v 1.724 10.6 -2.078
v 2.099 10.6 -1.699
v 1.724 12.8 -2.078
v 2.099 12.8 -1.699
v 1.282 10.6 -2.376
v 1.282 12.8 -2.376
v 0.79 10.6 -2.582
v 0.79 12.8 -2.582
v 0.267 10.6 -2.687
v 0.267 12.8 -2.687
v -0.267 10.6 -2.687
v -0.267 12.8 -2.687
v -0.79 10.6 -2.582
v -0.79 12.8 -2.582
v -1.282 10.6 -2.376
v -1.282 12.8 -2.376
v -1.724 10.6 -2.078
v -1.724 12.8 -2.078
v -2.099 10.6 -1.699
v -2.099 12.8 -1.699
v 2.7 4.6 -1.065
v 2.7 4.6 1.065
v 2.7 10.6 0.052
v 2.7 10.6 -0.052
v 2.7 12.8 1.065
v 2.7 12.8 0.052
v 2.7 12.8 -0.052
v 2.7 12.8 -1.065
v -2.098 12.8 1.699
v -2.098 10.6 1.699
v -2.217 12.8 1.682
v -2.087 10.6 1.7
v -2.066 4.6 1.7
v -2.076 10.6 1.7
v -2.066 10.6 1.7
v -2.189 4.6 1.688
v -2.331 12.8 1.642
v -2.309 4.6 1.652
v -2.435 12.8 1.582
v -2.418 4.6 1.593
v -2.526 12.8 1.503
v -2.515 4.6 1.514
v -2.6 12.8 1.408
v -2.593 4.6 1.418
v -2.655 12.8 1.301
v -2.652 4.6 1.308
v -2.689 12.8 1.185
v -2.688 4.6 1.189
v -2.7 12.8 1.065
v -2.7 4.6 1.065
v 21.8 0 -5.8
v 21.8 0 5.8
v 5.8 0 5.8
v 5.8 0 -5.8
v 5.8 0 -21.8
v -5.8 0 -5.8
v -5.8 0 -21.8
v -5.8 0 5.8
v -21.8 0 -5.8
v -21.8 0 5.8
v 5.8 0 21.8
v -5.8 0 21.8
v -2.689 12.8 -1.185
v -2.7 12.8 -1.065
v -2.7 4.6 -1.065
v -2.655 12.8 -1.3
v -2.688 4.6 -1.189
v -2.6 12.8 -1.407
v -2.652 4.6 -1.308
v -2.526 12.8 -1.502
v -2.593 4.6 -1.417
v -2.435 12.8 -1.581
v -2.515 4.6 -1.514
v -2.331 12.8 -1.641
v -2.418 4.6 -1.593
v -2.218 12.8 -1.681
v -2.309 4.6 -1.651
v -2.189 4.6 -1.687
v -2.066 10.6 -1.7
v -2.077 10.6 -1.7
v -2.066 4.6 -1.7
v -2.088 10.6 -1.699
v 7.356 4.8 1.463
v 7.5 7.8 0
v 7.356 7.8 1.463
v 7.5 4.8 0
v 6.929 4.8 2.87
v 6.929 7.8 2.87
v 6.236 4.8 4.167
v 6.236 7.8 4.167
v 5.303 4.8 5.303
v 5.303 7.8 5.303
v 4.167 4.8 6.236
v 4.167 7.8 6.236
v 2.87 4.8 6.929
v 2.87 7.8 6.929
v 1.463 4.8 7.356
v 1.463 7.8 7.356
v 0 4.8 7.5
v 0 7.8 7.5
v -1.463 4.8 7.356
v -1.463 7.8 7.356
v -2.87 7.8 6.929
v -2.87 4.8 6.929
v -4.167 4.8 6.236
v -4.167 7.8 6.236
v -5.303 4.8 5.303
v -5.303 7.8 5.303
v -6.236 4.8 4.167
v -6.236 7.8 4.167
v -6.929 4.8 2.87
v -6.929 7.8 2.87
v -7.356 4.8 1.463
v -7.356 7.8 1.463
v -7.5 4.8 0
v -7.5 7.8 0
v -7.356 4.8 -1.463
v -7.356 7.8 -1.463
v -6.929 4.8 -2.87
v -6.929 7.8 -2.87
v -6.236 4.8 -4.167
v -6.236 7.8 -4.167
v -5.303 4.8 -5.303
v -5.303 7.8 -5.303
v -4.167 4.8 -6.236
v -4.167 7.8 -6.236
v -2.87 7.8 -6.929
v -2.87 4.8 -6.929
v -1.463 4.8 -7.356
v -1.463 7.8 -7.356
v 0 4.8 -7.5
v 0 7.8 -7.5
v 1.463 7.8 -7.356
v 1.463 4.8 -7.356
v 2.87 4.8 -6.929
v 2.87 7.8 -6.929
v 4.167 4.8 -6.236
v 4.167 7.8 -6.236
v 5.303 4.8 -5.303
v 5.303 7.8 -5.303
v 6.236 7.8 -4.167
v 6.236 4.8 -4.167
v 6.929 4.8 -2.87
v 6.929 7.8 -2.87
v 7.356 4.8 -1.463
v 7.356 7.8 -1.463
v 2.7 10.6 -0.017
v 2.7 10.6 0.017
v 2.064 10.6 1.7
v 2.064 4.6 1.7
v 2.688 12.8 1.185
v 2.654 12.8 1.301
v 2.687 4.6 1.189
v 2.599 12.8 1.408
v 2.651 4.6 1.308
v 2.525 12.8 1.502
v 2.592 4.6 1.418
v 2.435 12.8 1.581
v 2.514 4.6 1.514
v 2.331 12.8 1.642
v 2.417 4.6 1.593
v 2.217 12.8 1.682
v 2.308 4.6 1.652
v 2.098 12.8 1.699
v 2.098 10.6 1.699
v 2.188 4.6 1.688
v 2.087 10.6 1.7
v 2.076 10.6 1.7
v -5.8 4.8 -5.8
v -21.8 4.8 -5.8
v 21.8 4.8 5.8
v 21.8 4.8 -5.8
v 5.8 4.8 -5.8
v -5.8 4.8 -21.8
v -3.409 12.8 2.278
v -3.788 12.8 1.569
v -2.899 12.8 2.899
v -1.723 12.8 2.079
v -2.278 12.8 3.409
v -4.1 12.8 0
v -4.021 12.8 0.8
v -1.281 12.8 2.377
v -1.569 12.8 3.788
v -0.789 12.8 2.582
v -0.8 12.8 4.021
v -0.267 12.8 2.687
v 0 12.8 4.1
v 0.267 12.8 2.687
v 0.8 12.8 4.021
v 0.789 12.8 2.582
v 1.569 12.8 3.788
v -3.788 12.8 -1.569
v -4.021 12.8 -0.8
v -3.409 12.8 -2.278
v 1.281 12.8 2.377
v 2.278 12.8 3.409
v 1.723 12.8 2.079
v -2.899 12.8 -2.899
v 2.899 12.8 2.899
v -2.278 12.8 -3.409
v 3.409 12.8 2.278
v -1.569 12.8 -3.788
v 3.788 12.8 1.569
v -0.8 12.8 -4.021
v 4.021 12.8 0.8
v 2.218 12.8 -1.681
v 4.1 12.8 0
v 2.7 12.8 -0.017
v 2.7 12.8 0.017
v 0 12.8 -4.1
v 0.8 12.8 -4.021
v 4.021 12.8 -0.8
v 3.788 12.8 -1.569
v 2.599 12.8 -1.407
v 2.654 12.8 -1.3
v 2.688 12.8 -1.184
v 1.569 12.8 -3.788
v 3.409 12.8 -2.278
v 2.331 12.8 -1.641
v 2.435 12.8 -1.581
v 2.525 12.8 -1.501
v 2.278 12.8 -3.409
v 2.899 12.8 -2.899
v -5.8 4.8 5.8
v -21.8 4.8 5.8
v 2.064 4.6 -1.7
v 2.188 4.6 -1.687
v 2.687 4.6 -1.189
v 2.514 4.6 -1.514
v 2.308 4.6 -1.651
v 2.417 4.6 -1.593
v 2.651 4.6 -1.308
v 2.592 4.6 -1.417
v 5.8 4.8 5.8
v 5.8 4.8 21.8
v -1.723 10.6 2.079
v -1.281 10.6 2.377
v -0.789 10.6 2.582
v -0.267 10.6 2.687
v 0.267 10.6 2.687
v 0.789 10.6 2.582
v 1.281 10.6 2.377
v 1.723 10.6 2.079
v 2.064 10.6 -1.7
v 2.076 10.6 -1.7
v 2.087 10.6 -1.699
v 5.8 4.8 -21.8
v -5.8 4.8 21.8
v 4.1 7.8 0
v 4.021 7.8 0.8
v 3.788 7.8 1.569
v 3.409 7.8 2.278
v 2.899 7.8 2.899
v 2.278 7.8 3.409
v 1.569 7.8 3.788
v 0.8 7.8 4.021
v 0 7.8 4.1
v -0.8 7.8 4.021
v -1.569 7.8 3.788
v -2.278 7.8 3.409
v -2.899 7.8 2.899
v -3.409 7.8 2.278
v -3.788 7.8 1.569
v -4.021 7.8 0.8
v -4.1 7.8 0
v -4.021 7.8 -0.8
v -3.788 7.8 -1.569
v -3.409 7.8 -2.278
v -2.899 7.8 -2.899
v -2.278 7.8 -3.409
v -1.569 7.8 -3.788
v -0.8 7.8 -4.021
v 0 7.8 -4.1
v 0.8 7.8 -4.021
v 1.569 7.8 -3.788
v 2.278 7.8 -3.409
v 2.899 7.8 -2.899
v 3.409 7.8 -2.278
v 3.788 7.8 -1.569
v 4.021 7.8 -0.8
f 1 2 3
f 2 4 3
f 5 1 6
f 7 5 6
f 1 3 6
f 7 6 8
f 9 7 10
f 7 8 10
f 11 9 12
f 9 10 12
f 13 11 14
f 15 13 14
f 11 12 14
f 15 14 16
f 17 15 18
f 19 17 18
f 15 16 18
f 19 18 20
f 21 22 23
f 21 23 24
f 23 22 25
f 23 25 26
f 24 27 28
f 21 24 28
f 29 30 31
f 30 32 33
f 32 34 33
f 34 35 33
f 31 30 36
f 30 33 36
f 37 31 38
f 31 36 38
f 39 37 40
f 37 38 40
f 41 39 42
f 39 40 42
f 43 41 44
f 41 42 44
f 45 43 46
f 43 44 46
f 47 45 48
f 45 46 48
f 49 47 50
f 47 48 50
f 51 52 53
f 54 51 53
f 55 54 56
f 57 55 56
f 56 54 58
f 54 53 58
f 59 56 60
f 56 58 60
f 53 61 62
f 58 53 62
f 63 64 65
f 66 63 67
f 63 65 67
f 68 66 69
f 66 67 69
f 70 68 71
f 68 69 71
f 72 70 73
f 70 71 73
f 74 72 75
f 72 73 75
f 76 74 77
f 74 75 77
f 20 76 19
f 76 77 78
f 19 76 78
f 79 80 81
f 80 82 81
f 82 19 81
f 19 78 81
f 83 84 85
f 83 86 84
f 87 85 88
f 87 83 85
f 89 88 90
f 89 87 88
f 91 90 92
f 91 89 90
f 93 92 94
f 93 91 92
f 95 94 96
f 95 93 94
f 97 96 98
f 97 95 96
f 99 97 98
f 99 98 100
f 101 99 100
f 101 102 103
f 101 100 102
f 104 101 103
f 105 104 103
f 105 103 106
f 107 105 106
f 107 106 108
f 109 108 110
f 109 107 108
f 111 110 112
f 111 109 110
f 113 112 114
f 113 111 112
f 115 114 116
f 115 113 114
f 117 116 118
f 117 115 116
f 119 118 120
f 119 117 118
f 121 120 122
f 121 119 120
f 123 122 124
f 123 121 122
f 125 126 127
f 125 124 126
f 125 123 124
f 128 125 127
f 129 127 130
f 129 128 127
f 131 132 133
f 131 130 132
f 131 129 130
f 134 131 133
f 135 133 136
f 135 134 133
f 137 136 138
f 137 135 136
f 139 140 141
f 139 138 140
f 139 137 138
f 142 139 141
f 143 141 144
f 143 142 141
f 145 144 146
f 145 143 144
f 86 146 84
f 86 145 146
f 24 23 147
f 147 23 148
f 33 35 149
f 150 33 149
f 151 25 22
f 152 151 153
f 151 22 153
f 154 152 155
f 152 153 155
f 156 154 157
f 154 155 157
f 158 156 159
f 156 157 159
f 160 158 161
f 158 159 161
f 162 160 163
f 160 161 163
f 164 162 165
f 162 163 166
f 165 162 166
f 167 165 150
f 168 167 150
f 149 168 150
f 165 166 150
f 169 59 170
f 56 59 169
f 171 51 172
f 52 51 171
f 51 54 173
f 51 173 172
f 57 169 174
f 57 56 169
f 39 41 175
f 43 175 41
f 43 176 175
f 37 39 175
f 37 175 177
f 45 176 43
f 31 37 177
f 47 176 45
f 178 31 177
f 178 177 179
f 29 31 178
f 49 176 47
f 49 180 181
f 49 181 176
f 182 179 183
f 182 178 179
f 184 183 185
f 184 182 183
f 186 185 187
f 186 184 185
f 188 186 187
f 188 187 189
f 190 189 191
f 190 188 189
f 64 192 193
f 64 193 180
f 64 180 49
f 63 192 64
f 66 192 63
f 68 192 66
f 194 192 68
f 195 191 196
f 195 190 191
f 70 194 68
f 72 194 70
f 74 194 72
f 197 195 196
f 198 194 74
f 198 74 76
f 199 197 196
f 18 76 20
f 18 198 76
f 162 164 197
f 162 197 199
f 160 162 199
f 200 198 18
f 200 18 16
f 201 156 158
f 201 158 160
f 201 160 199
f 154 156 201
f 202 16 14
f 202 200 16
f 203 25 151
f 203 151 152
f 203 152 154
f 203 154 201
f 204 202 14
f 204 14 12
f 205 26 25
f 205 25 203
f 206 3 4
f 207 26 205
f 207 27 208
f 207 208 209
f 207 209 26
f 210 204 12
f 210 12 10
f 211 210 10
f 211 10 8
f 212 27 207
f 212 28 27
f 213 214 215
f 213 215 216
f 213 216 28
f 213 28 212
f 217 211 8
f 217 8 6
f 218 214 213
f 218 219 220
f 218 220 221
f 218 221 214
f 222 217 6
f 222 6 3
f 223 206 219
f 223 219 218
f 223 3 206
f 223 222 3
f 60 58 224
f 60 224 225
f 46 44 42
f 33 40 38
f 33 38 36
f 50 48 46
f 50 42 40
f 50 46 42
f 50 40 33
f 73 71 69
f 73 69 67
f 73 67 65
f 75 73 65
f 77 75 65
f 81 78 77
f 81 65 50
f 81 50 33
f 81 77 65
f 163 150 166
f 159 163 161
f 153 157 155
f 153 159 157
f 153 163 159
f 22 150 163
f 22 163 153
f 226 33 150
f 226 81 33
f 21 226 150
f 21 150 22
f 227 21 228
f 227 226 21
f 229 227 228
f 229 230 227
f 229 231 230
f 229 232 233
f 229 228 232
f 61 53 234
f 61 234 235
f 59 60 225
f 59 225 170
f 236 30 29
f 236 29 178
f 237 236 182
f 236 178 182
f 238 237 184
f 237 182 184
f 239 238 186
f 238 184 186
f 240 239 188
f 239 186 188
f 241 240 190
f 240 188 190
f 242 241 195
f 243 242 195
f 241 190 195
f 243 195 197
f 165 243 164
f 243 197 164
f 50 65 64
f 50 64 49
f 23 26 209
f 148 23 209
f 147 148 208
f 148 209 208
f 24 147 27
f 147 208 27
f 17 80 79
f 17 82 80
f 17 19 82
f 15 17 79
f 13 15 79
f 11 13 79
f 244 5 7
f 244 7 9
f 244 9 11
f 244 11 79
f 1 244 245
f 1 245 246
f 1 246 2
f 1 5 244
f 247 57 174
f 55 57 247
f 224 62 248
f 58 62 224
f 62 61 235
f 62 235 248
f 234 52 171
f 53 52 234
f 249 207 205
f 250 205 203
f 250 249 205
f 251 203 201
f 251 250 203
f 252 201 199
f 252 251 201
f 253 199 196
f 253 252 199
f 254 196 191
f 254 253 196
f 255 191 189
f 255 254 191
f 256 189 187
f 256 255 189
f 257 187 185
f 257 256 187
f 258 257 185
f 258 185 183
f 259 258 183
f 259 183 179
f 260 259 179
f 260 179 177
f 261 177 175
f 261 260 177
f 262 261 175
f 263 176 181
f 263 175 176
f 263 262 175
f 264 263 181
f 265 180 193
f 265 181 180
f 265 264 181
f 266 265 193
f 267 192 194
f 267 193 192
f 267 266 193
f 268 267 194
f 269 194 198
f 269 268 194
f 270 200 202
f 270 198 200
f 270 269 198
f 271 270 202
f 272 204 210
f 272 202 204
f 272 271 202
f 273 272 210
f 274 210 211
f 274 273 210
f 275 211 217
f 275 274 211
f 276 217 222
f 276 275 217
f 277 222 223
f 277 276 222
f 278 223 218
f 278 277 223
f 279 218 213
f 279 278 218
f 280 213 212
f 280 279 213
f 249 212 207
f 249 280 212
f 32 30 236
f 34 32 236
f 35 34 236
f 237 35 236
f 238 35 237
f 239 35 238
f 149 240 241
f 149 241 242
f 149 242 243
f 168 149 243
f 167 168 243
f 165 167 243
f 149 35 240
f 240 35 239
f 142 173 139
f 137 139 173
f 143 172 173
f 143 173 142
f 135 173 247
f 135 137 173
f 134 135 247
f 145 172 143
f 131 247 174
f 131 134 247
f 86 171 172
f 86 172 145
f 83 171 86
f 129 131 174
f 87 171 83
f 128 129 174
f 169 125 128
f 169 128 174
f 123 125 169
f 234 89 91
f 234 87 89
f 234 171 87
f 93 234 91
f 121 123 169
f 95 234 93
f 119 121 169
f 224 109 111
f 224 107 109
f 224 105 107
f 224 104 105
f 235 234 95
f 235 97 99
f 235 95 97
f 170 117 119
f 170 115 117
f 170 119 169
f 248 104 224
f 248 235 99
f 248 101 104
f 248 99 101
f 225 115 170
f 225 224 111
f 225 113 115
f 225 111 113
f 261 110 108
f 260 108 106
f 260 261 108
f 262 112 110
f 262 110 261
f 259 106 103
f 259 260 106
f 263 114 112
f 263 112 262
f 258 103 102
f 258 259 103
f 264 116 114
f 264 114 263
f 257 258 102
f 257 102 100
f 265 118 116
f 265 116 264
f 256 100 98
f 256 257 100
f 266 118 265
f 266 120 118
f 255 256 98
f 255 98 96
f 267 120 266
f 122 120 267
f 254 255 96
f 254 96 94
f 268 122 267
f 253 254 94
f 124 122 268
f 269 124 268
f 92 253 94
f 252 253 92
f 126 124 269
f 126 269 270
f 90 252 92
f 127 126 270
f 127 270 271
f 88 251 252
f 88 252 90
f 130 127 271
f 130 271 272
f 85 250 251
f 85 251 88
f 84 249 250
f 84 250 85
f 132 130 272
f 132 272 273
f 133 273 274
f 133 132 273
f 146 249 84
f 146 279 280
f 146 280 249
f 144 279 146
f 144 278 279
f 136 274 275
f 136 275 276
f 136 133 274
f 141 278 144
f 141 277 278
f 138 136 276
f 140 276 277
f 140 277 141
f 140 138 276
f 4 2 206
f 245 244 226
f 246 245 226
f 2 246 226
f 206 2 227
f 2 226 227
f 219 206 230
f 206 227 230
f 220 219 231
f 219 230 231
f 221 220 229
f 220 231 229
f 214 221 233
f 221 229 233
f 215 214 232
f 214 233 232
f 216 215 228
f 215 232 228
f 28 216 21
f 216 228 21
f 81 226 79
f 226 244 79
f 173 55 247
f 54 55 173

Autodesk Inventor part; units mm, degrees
ref_plane "YZ Plane" through (0, 0, 0) normal (1, 0, 0) x (0, 1, 0)
ref_plane "XZ Plane" through (0, 0, 0) normal (0, 1, 0) x (-1, 0, 0)
ref_plane "XY Plane" through (0, 0, 0) normal (0, 0, 1) x (1, 0, 0)
sketch "Sketch1" plane through (0, 0, 0) normal (0, 1, 0) x (-1, 0, 0)
  line L0 (0, 0) -> (0, 25)
  line L1 (0, 0) -> (-25, 0)
  line L2 (0, 0) -> (0, -25)
  line L3 (0, 0) -> (25, 0)
  line L4 (25, 0) -> (25, -9)
  line L5 (0, -25) -> (9, -25)
  line L6 (9, -25) -> (9, -9)
  line L7 (9, -9) -> (25, -9)
  line L8 (0, -25) -> (-9, -25)
  line L9 (-9, -25) -> (-9, -9)
  line L10 (-9, -9) -> (-25, -9)
  line L11 (-25, -9) -> (-25, 0)
  line L12 (-25, 0) -> (-25, 9)
  line L13 (-25, 9) -> (-9, 9)
  line L14 (-9, 9) -> (-9, 25)
  line L15 (-9, 25) -> (0, 25)
  line L16 (9, 25) -> (0, 25)
  line L17 (9, 25) -> (9, 9)
  line L18 (9, 9) -> (25, 9)
  line L19 (25, 9) -> (25, 0)
  line L20 (21.8, -5.8) -> (5.8, -5.8)
  line L21 (5.8, -5.8) -> (5.8, -21.8)
  line L22 (5.8, -21.8) -> (-5.8, -21.8)
  line L23 (-5.8, -21.8) -> (-5.8, -5.8)
  line L24 (-5.8, -5.8) -> (-21.8, -5.8)
  line L25 (-21.8, -5.8) -> (-21.8, 5.8)
  line L26 (-21.8, 5.8) -> (-5.8, 5.8)
  line L27 (-5.8, 5.8) -> (-5.8, 21.8)
  line L28 (-5.8, 21.8) -> (5.8, 21.8)
  line L29 (5.8, 21.8) -> (5.8, 5.8)
  line L30 (5.8, 5.8) -> (21.8, 5.8)
  line L31 (21.8, 5.8) -> (21.8, -5.8)
  dimension "d0" = 25
  dimension "d1" = 25
  dimension "d2" = 25
  dimension "d3" = 25
  dimension "d4" = 9
  dimension "d5" = 9
  dimension "d6" = 9
  dimension "d7" = 9
  dimension "d8" = 9
  dimension "d9" = 9
  dimension "d10" = 9
  dimension "d11" = 9
  dimension "d34" = 3.2
  dimension "d35" = 3.2
  dimension "d36" = 3.2
  dimension "d37" = 3.2
  dimension "d38" = 3.2
  dimension "d39" = 3.2
  dimension "d40" = 3.2
  dimension "d41" = 3.2
  dimension "d42" = 3.2
  dimension "d43" = 3.2
  dimension "d44" = 3.2
  dimension "d45" = 3.2
extrude "Extrusion1" add sketch "Sketch1" along normal blind 4.8 contours L1 L25 L26 L27 L28 L0 | L2 L22 L23 L24 L25 L1 | L3 L31 L20 L21 L22 L2 | L0 L28 L29 L30 L31 L3
sketch "Sketch3" plane through (0, 4.8, 0) normal (0, 1, 0) x (1, 0, 0)
  circle A0 centre (0, 0) radius 4.1
  dimension "d18" = 8.2
extrude "Extrusion3" add sketch "Sketch3" along normal blind 8
sketch "Sketch6" plane through (0, 4.8, 0) normal (0, 1, 0) x (1, 0, 0)
  circle A0 centre (0, 0) radius 7.5
  dimension "d31" = 15
extrude "Extrusion6" add sketch "Sketch6" along normal blind 3
sketch "Sketch4" plane through (0, 12.8, 0) normal (0, 1, 0) x (1, 0, 0)
  line L0 (-0.0005, -0.0003) -> (-0.0005, -1.7003)
  line L1 (-0.0005, -1.7003) -> (2.6995, -1.7003)
  line L2 (2.6995, -1.7003) -> (2.6995, 1.6997)
  line L3 (2.6995, 1.6997) -> (-2.7005, 1.6997)
  line L4 (-2.7005, 1.6997) -> (-2.7005, -1.7003)
  line L5 (-2.7005, -1.7003) -> (-0.0005, -1.7003)
  point P0 (0, 0)
  dimension "d21" = 1.7
  dimension "d22" = 2.7
  dimension "d23" = 3.4
  dimension "d24" = 5.4
extrude "Extrusion4" cut sketch "Sketch4" against normal blind 8.2
sketch "Sketch5" plane through (0, 12.8, 0) normal (0, 1, 0) x (1, 0, 0)
  circle A0 centre (0, 0) radius 2.7
  dimension "d27" = 5.4
extrude "Extrusion5" cut sketch "Sketch5" against normal blind 2.2
fillet "Fillet1" radius 0.635 4 edges at (-2.7005, 8.7, -1.6997) (-2.7005, 8.7, 1.7003) (2.6995, 8.7, -1.6997) (2.6995, 8.7, 1.7003)
equation "\"d5\" = d4"
equation "\"d6\" = d4"
equation "\"d7\" = d4"
equation "\"d35\" = d34"
equation "\"d36\" = d34"
equation "\"d37\" = d34"
equation "\"d38\" = d34"
equation "\"d39\" = d34"
equation "\"d40\" = d34"
equation "\"d41\" = d34"
equation "\"d42\" = d34"
equation "\"d44\" = d34"
equation "\"d21\" = 0.5 * d23"
properties part number "Motor_Key_Cross"
